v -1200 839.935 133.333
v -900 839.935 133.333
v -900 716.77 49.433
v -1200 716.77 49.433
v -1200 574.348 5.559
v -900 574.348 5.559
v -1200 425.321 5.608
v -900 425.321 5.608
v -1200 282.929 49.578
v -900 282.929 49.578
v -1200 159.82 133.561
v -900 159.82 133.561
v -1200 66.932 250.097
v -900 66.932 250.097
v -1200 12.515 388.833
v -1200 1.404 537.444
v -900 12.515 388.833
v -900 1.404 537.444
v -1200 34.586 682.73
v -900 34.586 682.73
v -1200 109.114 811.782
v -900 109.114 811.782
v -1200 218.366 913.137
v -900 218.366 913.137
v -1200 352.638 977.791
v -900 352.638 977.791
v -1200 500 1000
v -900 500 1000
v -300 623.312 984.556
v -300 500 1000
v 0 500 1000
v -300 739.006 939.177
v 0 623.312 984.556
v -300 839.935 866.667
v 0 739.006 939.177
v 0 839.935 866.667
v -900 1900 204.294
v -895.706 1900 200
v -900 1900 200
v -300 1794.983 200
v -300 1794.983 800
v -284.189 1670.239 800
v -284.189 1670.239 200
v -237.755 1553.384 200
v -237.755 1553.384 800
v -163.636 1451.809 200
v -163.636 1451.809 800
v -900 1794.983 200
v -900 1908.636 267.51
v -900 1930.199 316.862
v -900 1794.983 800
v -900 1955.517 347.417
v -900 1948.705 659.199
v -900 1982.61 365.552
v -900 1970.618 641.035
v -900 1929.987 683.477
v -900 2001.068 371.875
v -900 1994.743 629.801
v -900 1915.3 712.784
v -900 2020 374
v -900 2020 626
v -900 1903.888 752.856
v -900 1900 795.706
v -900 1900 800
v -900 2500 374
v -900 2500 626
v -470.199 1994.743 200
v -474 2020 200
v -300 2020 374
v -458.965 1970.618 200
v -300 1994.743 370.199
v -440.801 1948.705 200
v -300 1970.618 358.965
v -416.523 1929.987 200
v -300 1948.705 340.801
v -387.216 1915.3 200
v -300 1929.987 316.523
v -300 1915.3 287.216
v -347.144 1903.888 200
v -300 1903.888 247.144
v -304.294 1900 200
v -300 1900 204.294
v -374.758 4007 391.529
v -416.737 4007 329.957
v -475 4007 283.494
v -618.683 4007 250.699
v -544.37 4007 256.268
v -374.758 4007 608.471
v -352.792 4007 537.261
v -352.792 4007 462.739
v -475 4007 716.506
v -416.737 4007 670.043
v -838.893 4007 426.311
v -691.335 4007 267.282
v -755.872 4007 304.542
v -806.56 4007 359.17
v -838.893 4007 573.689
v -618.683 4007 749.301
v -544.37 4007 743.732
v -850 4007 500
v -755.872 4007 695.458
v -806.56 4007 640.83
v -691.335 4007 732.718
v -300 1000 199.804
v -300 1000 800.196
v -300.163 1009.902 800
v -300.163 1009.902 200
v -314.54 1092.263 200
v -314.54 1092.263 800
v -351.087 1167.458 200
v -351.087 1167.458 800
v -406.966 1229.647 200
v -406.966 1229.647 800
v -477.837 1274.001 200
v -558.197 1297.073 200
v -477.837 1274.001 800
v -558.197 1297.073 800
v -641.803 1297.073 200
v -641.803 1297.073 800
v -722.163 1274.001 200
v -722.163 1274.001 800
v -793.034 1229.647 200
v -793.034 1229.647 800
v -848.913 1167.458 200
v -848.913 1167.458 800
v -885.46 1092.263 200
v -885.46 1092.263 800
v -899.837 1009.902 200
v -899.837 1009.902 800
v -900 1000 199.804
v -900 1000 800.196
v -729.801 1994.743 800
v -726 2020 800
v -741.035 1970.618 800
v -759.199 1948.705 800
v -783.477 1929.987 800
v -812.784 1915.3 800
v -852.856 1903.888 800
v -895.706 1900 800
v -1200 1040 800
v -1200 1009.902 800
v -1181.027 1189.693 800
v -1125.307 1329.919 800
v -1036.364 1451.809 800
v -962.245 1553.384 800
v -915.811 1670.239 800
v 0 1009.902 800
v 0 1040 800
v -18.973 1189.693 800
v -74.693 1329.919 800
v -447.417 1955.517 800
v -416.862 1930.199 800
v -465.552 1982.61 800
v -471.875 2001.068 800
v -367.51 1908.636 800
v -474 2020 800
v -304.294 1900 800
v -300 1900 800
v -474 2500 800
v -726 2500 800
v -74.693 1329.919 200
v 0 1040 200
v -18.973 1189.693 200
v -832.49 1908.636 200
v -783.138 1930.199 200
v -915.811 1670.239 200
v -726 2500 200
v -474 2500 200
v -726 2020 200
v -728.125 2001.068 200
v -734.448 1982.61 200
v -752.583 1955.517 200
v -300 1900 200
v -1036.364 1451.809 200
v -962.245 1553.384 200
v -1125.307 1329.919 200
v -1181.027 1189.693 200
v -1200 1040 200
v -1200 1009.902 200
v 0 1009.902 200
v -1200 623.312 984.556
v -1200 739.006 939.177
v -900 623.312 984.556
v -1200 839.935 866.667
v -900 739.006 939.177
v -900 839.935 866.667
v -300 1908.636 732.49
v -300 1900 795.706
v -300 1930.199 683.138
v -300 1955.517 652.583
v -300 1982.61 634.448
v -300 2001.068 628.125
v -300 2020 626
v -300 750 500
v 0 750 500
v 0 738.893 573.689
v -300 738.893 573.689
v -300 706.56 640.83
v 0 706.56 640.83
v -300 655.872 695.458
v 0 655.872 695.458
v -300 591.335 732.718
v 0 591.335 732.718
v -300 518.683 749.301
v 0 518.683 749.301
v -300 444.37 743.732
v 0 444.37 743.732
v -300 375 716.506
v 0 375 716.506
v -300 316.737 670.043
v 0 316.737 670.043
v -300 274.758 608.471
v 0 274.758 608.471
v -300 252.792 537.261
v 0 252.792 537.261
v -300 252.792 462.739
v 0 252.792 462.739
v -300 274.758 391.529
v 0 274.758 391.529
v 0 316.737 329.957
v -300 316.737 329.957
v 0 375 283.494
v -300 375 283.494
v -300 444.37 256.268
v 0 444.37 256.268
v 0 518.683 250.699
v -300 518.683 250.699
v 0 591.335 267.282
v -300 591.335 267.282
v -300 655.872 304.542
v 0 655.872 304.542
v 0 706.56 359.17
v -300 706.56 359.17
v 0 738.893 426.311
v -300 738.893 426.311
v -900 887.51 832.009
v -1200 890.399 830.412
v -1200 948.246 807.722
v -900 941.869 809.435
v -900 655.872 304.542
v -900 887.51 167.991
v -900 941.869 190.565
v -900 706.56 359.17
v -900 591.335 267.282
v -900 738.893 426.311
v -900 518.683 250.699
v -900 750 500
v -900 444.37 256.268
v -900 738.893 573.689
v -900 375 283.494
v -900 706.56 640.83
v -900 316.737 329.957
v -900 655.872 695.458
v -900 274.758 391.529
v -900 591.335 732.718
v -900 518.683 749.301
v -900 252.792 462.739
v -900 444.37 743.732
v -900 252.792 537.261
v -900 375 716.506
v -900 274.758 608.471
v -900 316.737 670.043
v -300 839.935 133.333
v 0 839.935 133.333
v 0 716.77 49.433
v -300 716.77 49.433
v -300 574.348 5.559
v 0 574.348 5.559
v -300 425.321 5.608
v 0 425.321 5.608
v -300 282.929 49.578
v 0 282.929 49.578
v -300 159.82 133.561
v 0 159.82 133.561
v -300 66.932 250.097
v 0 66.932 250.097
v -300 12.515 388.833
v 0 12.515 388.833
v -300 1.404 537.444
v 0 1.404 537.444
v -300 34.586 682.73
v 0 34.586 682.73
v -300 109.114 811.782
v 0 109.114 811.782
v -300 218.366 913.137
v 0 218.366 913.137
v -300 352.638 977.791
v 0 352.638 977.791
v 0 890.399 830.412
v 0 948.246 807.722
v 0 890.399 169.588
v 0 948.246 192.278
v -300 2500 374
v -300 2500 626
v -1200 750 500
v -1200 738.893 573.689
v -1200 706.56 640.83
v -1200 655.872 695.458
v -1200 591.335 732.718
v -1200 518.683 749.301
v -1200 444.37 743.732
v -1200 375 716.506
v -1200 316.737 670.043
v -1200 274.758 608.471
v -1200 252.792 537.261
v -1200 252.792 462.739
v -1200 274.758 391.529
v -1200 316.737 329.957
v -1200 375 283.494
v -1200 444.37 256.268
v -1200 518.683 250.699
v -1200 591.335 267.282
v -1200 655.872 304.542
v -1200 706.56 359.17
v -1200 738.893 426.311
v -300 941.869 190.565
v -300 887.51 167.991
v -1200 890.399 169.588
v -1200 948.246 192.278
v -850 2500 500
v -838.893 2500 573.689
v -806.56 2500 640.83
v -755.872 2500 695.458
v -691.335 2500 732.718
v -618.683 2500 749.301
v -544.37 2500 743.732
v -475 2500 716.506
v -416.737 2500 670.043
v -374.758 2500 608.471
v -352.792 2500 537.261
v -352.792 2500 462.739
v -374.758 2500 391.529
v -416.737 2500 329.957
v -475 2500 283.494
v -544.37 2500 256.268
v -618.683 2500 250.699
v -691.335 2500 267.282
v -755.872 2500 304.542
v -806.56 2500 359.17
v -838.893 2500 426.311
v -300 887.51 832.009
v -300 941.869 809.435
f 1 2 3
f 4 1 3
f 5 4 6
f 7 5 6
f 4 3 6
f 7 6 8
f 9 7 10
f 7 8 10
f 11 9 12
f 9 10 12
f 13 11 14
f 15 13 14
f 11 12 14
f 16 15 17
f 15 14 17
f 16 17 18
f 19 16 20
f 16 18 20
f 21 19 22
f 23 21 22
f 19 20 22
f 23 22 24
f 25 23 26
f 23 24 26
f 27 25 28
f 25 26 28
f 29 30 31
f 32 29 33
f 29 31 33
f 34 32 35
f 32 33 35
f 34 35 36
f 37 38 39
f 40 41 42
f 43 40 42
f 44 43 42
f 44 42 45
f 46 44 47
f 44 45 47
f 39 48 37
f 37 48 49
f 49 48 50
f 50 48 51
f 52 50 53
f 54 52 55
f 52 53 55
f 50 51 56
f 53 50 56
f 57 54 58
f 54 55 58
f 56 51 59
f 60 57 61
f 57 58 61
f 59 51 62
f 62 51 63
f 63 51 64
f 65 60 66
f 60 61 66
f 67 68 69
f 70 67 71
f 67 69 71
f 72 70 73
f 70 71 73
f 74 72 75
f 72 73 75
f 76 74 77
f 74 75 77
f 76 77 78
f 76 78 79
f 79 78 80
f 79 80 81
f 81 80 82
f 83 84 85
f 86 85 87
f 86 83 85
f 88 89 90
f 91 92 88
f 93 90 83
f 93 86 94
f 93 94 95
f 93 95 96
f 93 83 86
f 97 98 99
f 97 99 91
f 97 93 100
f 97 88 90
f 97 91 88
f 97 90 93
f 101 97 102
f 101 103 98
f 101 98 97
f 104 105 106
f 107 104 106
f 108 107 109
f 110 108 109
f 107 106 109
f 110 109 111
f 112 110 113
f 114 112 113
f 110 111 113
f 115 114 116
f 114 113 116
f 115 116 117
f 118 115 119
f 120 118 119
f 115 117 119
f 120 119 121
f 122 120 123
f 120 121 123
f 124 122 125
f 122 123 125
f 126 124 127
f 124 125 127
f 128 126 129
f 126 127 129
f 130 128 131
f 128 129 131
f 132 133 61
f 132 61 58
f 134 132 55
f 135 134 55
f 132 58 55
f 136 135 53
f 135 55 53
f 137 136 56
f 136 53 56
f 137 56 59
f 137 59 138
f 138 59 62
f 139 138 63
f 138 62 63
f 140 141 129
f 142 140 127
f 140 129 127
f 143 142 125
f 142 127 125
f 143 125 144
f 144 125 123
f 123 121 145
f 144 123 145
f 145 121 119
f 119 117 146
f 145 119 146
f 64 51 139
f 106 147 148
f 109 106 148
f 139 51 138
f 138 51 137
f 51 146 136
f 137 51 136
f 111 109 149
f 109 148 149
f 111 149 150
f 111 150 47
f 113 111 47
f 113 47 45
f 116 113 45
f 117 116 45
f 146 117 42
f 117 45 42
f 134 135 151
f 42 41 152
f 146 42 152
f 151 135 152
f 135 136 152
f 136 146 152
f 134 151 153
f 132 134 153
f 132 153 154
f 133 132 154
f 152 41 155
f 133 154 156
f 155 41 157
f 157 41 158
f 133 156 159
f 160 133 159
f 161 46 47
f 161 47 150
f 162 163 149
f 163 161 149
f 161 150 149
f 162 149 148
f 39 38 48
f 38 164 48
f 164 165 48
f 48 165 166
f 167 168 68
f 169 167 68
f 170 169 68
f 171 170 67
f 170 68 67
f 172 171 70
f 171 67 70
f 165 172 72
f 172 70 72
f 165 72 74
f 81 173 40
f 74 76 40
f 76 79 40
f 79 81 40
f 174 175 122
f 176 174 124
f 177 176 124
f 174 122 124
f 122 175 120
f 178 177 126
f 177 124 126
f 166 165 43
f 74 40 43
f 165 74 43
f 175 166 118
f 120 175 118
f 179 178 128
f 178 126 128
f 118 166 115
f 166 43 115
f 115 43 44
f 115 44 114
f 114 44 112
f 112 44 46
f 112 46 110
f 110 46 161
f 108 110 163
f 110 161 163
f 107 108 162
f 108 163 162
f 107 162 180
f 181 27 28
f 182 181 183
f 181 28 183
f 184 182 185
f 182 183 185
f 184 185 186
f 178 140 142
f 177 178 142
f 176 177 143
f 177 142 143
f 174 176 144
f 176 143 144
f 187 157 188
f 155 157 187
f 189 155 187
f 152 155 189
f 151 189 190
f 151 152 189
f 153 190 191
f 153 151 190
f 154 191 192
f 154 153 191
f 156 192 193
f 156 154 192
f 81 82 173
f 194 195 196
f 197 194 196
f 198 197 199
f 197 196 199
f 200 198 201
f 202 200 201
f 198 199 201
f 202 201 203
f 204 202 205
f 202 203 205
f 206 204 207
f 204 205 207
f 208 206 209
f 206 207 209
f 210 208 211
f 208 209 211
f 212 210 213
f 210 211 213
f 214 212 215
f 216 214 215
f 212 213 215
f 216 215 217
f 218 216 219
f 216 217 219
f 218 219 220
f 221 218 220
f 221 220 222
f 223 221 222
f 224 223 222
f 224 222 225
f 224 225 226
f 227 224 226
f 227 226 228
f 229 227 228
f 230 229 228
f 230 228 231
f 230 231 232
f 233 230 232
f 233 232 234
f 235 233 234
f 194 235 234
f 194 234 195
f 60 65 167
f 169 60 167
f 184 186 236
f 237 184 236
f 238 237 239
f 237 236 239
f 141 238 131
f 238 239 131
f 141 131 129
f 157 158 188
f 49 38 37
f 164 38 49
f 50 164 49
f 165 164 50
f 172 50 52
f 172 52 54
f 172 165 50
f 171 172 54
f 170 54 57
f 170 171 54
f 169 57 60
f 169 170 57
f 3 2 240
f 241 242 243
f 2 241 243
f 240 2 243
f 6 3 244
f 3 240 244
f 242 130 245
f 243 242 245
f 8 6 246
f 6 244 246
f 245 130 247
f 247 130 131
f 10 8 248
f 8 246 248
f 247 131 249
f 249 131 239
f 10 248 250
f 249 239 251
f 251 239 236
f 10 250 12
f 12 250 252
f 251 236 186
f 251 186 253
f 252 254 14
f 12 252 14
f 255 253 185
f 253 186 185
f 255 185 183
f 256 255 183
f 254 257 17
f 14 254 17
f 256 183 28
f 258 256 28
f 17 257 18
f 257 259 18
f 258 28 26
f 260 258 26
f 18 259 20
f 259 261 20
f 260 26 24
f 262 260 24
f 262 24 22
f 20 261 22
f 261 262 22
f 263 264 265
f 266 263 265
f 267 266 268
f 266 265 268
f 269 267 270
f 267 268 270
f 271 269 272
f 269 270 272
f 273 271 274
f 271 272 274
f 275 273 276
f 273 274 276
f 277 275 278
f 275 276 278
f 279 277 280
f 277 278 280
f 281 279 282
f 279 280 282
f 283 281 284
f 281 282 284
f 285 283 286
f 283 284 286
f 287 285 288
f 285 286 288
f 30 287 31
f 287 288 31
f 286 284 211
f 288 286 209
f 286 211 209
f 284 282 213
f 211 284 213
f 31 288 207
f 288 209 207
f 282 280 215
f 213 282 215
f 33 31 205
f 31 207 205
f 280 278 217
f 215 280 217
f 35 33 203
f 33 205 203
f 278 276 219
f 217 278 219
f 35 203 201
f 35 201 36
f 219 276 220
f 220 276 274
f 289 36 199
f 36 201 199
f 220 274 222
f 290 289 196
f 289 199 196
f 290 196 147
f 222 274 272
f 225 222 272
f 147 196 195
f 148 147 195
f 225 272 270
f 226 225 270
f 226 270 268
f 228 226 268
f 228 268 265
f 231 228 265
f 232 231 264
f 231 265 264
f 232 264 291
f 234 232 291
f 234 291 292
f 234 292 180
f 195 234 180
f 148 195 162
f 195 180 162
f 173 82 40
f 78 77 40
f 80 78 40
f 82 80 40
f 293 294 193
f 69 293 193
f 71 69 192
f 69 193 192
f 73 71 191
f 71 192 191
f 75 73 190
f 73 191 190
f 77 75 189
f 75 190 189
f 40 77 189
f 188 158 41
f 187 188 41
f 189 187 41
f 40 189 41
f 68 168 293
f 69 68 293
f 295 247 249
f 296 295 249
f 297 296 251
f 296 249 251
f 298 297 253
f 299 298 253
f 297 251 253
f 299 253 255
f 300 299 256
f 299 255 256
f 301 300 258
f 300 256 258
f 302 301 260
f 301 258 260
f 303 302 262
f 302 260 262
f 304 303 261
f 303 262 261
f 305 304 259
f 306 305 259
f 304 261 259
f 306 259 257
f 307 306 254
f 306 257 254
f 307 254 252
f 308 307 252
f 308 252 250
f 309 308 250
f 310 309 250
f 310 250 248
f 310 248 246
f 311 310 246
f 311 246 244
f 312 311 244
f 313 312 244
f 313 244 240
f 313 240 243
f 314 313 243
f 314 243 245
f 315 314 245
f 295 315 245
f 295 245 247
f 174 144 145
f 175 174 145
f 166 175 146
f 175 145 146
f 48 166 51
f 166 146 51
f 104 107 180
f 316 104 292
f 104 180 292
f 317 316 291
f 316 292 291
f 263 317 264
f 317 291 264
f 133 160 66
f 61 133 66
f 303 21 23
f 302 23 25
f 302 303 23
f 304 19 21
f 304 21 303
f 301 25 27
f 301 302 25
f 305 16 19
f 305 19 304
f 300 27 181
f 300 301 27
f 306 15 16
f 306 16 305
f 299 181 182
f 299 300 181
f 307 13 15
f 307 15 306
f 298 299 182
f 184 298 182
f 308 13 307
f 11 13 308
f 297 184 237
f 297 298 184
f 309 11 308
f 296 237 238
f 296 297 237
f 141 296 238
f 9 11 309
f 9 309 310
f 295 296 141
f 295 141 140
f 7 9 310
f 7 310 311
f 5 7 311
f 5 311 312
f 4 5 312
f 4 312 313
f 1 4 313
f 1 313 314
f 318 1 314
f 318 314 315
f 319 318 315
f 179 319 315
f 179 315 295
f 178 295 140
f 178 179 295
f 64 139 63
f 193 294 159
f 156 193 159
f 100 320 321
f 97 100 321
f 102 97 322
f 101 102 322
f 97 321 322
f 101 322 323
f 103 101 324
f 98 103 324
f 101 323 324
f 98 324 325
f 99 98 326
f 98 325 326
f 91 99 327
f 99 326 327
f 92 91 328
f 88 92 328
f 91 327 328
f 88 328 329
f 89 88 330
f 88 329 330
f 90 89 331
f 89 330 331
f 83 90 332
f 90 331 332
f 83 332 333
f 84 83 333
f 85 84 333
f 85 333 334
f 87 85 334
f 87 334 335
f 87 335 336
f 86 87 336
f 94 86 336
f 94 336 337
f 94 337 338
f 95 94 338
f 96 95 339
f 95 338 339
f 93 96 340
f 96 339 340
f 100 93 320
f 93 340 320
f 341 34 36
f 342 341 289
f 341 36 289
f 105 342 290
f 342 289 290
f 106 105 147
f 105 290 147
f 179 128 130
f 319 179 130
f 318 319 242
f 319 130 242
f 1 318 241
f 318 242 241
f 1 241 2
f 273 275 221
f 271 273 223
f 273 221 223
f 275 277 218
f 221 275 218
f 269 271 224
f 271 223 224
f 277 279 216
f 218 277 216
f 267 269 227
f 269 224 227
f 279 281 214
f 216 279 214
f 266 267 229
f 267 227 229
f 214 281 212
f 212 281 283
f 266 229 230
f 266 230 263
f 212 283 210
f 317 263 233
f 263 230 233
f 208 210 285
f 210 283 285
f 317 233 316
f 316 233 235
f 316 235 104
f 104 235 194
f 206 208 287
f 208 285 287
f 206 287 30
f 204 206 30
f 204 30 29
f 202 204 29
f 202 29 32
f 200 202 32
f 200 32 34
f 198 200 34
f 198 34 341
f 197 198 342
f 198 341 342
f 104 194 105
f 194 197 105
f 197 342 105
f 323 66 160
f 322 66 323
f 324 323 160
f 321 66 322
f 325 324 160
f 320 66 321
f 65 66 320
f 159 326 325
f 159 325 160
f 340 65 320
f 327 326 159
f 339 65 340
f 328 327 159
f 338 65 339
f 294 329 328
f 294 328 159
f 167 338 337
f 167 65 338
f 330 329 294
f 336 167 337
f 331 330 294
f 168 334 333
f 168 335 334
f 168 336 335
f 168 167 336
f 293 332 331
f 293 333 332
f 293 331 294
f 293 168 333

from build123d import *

# Parameters (mm, degrees)
F0_W     = 1200
F0_H     = 2500
F1_DEPTH = 1000
F3_DEPTH = 1000.001
F4_R     = 250
F5_DEPTH = 1200.001
F7_DEPTH = 600
F8_R     = 250
F9_DEPTH = 1507
F10_R    = 120


with BuildPart() as f1:
    # F0 (on Top) → F1 (new body)
    with BuildSketch(Plane.XY):
        with Locations((-600, 1250)):
            Rectangle(F0_W, F0_H)
    extrude(amount=F1_DEPTH)

    # F2 (on face) → F3 (cut, through all)
    with BuildSketch(Plane.XY.offset(1000)):
        with BuildLine():
            Line((-300, 520.3847577293), (-300, 1000))
            ThreePointArc((-300, 1000), (-600, 1300), (-900, 1000))
            Line((-900, 1000), (-900, 520.3847577293))
            ThreePointArc((-900, 520.3847577293), (-600, 440), (-300, 520.3847577293))
        make_face()
        with BuildLine():
            Line((-300, 0), (-300, 520.3847577293))
            ThreePointArc((-300, 520.3847577293), (-600, 440), (-900, 520.3847577293))
            Line((-900, 520.3847577293), (-900, 0))
            Line((-900, 0), (-300, 0))
        make_face()
        with BuildLine():
            Line((-1200, 2500), (-1200, 1039.9999999999))
            ThreePointArc((-1200, 1039.9999999999), (-1157.5922263708, 1261.5646837628), (-1036.3636363636, 1451.8091510148))
            ThreePointArc((-1036.3636363636, 1451.8091510148), (-935.3398113577, 1610.3462070581), (-900, 1794.9834435271))
            Line((-900, 1794.9834435271), (-900, 2500))
            Line((-900, 2500), (-1200, 2500))
        make_face()
        with BuildLine():
            ThreePointArc((-163.6363636364, 1451.8091510148), (-42.4077736292, 1261.5646837628), (0, 1040))
            Line((0, 1040), (0, 2500))
            Line((0, 2500), (-300, 2500))
            Line((-300, 2500), (-300, 1794.9834435271))
            ThreePointArc((-300, 1794.9834435271), (-264.6601886423, 1610.3462070581), (-163.6363636364, 1451.8091510148))
        make_face()
    extrude(amount=-F3_DEPTH, mode=Mode.SUBTRACT)

    # F4 (on face) → F5 (cut, through all)
    with BuildSketch(Plane.YZ):
        with BuildLine():
            ThreePointArc((0, 500), (146.4466094067, 853.5533905933), (500.0000000001, 1000))
            Line((500.0000000001, 1000), (0, 1000))
            Line((0, 1000), (0, 500))
        make_face()
        with BuildLine():
            ThreePointArc((500, 0), (146.4466094067, 146.4466094067), (0, 500))
            Line((0, 500), (0, 0))
            Line((0, 0), (500, 0))
        make_face()
        with BuildLine():
            ThreePointArc((839.9346342395, 133.3333333333), (682.5741858351, 34.5253318744), (500, 0))
            Line((500, 0), (1040, 0))
            Line((1040, 0), (1040, 200))
            Line((1040, 200), (1009.9019513593, 200))
            ThreePointArc((1009.9019513593, 200), (918.6148584418, 182.7373340628), (839.9346342395, 133.3333333333))
        make_face()
        Polygon((2500, 200), (1040, 200), (1040, 0), (1451.8091510148, 0), (1794.9834435271, 0), (2500, 0), align=None)
        with BuildLine():
            ThreePointArc((500.0000000001, 1000), (682.5741858351, 965.4746681256), (839.9346342395, 866.6666666667))
            ThreePointArc((839.9346342395, 866.6666666667), (918.6148584418, 817.2626659372), (1009.9019513593, 800))
            Line((1009.9019513593, 800), (1040, 800))
            Line((1040, 800), (1040, 1000))
            Line((1040, 1000), (500.0000000001, 1000))
        make_face()
        Polygon((1451.8091510148, 1000), (1040, 1000), (1040, 800), (2500, 800), (2500, 1000), (1794.9834435271, 1000), align=None)
        with Locations((500, 500)):
            Circle(F4_R)
    extrude(amount=-F5_DEPTH, mode=Mode.SUBTRACT)

    # F6 (on face) → F7 (cut)
    with BuildSketch(Plane(origin=(0, 2500, 0), x_dir=(-1, 0, 0), z_dir=(0, 1, 0))):
        Polygon((900, 626), (900, 800), (726, 800), align=None)
        Polygon((300, 626), (474, 800), (300, 800), align=None)
        Polygon((474, 200), (300, 374), (300, 200), align=None)
        Polygon((900, 200), (900, 374), (726, 200), align=None)
    extrude(amount=-F7_DEPTH, mode=Mode.SUBTRACT)

    # F8 (on face) → F9 (join)
    with BuildSketch(Plane(origin=(0, 2500, 0), x_dir=(-1, 0, 0), z_dir=(0, 1, 0))):
        with Locations((600, 500)):
            Circle(F8_R)
    extrude(amount=F9_DEPTH)

    # F10
    f10_edges = [f1.edges().sort_by_distance(p)[0] for p in [
        (-813, 1900, 713),
        (-387, 1900, 713),
        (-813, 1900, 287),
        (-387, 1900, 287),
    ]]
    fillet(f10_edges, radius=F10_R)


solid = f1.part
